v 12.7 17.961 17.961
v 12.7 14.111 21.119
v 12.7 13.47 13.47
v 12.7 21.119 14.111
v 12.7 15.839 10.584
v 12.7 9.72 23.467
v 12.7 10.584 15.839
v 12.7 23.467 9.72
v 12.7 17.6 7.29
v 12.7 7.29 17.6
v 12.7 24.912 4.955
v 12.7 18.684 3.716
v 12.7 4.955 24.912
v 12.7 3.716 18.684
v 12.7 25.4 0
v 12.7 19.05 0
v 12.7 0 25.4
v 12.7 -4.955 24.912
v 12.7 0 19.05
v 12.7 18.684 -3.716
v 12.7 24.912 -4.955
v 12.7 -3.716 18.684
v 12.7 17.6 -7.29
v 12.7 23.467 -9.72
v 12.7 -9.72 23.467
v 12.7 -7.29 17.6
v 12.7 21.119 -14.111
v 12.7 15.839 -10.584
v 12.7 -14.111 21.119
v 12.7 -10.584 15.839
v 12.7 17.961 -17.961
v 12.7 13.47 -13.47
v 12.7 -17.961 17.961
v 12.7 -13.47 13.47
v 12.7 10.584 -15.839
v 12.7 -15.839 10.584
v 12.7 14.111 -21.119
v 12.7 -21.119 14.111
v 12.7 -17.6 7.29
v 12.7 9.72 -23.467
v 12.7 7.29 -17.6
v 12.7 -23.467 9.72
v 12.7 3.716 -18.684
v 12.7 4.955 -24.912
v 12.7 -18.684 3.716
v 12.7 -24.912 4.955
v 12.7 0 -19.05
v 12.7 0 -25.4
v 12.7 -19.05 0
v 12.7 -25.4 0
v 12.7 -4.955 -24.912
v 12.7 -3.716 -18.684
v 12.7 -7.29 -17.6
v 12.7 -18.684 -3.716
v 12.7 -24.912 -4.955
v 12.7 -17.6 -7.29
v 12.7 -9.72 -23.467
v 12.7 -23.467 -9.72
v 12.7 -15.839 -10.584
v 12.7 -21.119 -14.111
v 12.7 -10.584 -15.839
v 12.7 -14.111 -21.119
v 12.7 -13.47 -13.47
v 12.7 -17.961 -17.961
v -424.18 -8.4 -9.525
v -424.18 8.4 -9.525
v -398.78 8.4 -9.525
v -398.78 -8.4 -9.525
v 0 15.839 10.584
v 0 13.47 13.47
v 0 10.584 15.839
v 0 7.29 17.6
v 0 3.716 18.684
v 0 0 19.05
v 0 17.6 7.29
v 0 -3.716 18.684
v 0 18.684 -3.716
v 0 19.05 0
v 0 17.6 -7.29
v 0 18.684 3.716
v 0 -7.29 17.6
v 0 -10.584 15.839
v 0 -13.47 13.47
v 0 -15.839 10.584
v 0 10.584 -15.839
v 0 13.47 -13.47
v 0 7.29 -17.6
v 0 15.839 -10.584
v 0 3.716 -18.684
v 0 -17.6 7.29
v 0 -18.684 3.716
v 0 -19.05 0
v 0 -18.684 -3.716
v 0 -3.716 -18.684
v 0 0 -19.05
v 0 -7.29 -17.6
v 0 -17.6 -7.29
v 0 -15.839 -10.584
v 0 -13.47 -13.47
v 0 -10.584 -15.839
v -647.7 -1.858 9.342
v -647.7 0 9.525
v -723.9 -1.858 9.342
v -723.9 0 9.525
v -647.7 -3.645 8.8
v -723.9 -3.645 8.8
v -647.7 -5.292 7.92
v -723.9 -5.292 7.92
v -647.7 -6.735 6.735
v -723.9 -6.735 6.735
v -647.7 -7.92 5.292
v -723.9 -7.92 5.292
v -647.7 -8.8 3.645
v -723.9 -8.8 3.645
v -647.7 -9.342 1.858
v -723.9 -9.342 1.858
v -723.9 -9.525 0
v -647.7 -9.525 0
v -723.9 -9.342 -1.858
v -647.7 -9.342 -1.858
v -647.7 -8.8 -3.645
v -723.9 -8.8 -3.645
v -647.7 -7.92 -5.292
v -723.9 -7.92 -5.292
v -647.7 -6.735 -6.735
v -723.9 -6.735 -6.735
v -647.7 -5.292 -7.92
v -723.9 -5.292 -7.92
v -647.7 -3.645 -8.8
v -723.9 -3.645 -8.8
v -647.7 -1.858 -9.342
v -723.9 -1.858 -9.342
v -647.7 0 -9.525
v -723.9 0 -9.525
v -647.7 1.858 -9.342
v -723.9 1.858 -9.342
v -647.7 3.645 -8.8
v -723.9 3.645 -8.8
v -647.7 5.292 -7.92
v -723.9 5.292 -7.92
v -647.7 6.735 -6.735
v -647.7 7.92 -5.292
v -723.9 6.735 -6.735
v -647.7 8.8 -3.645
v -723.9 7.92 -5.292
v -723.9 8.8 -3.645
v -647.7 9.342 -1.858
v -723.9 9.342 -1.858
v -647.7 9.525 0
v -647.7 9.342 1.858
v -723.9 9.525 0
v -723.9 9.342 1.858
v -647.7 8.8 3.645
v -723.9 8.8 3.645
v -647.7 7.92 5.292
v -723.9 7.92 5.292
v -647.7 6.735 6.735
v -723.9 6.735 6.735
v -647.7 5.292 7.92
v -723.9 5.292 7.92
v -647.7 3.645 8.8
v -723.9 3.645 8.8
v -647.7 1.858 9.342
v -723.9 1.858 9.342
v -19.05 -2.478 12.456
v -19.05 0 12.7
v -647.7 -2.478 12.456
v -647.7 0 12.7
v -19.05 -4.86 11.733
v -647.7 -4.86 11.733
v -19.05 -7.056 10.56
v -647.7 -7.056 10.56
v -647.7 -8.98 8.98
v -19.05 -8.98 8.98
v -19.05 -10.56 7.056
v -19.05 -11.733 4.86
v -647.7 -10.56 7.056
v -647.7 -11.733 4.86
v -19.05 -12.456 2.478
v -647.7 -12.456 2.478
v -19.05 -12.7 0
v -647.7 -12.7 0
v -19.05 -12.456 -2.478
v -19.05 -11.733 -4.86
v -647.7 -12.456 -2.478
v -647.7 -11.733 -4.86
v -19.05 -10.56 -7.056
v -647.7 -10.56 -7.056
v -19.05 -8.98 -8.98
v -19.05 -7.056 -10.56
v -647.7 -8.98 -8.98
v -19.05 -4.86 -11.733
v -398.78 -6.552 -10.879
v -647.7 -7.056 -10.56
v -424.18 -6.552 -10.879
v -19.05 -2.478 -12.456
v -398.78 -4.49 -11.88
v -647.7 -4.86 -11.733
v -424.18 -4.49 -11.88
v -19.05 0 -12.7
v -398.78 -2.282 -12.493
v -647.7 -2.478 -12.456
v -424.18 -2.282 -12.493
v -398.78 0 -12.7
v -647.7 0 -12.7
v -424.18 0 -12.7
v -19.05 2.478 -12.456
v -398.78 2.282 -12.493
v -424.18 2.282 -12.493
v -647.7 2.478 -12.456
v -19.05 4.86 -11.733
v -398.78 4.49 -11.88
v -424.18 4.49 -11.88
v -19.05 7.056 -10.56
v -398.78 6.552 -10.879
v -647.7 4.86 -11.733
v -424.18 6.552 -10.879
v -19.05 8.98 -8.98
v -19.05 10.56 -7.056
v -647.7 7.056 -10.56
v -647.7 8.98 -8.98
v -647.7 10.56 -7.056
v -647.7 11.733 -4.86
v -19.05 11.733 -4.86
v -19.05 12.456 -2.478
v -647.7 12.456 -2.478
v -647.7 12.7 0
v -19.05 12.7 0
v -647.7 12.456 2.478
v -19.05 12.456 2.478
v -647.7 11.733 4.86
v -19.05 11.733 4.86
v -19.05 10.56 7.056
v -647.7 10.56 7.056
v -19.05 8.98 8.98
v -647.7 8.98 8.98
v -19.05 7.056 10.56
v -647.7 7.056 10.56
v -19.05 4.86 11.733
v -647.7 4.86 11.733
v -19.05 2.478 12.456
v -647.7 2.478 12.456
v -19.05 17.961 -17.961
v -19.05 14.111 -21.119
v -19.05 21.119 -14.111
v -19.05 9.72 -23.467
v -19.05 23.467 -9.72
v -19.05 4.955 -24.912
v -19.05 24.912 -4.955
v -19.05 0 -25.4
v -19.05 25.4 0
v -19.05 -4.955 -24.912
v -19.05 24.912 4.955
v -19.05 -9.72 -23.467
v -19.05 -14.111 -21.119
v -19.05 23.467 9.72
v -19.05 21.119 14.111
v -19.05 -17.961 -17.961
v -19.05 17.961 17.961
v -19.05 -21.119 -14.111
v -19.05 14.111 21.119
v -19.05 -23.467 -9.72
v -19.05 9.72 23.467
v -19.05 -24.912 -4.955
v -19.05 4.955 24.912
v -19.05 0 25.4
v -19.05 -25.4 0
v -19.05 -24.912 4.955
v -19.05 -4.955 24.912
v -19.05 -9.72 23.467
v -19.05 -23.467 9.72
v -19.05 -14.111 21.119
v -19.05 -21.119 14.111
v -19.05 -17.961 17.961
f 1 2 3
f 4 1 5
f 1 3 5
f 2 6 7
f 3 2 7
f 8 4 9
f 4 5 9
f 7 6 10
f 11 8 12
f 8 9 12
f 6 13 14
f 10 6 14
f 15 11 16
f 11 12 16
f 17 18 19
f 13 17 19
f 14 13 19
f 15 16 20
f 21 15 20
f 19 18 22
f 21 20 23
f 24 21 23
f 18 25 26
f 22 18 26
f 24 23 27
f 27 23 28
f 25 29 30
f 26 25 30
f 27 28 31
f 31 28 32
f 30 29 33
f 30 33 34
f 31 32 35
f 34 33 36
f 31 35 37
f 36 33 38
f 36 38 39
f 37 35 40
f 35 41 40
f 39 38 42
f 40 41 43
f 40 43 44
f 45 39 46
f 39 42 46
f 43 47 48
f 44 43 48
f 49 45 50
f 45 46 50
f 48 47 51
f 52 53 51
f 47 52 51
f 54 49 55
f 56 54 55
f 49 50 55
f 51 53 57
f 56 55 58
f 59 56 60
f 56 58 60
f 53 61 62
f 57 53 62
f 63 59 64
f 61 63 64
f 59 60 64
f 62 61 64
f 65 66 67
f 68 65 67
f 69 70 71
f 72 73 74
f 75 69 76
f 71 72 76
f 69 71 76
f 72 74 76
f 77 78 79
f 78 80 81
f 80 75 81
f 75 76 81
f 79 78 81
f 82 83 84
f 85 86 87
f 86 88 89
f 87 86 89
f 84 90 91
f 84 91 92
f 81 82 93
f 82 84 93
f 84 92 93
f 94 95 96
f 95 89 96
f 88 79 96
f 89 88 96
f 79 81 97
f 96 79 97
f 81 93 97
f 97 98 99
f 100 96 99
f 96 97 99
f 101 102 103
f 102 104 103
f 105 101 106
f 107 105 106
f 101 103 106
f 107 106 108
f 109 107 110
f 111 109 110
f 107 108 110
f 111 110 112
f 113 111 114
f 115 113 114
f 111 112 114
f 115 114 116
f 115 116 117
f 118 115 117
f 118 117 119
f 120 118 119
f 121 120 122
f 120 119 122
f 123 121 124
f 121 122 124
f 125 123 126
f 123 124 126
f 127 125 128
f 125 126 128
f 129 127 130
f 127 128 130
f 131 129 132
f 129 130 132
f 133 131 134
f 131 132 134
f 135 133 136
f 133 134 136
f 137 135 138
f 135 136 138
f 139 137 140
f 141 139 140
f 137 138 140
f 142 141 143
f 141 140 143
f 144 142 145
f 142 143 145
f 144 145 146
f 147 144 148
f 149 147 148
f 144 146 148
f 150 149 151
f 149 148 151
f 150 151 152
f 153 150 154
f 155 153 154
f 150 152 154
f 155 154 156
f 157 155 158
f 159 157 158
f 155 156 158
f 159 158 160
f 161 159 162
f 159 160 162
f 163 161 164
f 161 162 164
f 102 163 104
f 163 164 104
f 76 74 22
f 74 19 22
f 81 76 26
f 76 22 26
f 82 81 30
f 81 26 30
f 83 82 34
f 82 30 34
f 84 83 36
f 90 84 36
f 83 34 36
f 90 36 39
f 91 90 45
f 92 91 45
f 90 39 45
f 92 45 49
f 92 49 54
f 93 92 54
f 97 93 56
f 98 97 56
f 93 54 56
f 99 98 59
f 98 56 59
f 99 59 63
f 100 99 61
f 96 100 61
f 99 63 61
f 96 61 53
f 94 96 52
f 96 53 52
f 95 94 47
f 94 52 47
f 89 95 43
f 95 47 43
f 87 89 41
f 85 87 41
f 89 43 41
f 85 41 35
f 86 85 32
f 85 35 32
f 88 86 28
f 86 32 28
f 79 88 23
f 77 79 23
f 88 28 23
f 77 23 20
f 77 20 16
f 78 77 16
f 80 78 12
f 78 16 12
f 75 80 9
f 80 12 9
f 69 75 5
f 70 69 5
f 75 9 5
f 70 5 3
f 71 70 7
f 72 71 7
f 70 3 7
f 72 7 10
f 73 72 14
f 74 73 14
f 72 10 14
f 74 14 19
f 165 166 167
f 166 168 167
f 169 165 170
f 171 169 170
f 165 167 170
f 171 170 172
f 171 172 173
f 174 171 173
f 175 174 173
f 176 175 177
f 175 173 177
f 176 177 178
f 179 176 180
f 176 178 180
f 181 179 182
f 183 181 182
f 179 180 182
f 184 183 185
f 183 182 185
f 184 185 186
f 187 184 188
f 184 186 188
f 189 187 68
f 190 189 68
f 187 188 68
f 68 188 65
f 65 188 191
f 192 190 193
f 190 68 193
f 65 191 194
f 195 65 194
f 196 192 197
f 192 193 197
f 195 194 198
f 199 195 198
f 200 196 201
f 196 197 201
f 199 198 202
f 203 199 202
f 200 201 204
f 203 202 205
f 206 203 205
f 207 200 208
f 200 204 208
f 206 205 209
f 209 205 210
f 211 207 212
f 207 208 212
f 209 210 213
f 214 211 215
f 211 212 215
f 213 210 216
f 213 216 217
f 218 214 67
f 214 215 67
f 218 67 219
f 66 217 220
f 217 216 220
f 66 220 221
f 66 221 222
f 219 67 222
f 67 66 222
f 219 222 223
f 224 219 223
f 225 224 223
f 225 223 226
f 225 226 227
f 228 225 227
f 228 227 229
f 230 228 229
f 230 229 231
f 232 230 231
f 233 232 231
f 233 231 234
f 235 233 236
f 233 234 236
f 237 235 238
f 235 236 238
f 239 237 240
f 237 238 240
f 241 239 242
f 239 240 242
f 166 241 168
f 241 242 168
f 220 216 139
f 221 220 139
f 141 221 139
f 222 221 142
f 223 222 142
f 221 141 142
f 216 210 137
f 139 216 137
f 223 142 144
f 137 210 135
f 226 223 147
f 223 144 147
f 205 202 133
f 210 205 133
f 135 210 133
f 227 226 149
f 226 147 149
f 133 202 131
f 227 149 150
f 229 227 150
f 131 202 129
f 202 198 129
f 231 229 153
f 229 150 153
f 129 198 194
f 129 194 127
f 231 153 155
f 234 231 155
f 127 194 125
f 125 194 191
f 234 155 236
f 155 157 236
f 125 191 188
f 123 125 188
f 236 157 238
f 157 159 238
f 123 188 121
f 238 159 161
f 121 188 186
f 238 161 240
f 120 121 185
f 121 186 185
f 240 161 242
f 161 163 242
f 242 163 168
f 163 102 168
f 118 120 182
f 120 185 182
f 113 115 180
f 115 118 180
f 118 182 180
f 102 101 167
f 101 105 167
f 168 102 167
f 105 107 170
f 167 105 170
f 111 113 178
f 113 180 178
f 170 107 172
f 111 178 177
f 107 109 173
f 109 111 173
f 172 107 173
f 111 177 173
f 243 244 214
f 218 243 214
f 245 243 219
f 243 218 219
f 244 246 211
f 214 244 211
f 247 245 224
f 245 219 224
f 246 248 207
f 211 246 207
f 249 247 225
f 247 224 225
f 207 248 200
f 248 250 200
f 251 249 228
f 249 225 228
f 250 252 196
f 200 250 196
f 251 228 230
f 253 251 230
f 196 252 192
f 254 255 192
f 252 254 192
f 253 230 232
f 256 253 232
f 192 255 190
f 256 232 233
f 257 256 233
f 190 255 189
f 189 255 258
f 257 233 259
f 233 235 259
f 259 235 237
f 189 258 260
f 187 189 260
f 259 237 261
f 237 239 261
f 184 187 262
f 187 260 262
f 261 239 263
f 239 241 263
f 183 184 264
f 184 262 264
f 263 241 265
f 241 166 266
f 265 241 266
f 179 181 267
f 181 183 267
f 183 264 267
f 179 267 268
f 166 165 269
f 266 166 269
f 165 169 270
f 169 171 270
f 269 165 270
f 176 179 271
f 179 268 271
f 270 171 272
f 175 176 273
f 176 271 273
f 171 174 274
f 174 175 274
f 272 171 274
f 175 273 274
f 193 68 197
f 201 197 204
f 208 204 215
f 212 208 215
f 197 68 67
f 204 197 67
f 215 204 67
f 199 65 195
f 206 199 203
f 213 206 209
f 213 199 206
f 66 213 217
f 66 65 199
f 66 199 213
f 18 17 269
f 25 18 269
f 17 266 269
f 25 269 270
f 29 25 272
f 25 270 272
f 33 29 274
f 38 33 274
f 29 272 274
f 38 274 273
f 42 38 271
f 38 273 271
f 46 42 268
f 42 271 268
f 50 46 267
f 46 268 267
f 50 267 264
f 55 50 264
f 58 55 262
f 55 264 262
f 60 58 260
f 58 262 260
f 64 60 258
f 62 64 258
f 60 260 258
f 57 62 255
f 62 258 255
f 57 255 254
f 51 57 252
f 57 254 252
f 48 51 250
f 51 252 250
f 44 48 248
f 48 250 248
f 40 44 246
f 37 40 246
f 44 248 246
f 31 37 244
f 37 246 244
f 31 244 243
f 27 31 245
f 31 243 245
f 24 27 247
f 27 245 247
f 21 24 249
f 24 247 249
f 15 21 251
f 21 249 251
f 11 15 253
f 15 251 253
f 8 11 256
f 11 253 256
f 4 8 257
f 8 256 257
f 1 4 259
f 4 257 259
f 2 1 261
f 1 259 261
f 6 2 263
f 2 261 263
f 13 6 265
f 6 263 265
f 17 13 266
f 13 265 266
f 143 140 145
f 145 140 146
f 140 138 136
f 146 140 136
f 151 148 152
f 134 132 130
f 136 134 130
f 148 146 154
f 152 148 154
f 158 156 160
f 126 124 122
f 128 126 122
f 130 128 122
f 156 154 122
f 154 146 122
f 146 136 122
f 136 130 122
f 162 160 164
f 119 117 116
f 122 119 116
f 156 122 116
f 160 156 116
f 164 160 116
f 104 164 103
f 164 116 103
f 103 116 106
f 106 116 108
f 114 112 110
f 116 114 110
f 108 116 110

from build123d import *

# Parameters (mm, degrees)
SKETCH3_W               = 25.4
SKETCH3_H               = 3.175
CUT_EXTRUDE1_DEPTH      = 725.790680128
CUT_EXTRUDE1_DEPTH_BACK = 725.790680128


with BuildPart() as part:
    # Sketch2 → Revolve1 (revolve)
    with BuildSketch(Plane(origin=(0, 0, 0), x_dir=(1, 0, 0), z_dir=(0, 1, 0)), mode=Mode.PRIVATE) as revolve1_sk:
        Polygon((-723.9, 0), (0, 0), (0, 19.05), (12.7, 19.05), (12.7, 25.4), (-19.05, 25.4), (-19.05, 12.7), (-647.7, 12.7), (-647.7, 9.525), (-723.9, 9.525), align=None)
    revolve(revolve1_sk.sketch.rotate(Axis((-723.9, 0, 0), (1, 0, 0)), 180), axis=Axis((-723.9, 0, 0), (1, 0, 0)))

    # Sketch3 → Cut-Extrude1 (cut, two sides)
    with BuildSketch(Plane(origin=(0, 0, 0), x_dir=(1, 0, 0), z_dir=(0, 1, 0))) as cut_extrude1_sk:
        with Locations((-411.48, 11.1125)):
            Rectangle(SKETCH3_W, SKETCH3_H)
    extrude(amount=CUT_EXTRUDE1_DEPTH, mode=Mode.SUBTRACT)
    extrude(cut_extrude1_sk.sketch, amount=-CUT_EXTRUDE1_DEPTH_BACK, mode=Mode.SUBTRACT)


solid = part.part
